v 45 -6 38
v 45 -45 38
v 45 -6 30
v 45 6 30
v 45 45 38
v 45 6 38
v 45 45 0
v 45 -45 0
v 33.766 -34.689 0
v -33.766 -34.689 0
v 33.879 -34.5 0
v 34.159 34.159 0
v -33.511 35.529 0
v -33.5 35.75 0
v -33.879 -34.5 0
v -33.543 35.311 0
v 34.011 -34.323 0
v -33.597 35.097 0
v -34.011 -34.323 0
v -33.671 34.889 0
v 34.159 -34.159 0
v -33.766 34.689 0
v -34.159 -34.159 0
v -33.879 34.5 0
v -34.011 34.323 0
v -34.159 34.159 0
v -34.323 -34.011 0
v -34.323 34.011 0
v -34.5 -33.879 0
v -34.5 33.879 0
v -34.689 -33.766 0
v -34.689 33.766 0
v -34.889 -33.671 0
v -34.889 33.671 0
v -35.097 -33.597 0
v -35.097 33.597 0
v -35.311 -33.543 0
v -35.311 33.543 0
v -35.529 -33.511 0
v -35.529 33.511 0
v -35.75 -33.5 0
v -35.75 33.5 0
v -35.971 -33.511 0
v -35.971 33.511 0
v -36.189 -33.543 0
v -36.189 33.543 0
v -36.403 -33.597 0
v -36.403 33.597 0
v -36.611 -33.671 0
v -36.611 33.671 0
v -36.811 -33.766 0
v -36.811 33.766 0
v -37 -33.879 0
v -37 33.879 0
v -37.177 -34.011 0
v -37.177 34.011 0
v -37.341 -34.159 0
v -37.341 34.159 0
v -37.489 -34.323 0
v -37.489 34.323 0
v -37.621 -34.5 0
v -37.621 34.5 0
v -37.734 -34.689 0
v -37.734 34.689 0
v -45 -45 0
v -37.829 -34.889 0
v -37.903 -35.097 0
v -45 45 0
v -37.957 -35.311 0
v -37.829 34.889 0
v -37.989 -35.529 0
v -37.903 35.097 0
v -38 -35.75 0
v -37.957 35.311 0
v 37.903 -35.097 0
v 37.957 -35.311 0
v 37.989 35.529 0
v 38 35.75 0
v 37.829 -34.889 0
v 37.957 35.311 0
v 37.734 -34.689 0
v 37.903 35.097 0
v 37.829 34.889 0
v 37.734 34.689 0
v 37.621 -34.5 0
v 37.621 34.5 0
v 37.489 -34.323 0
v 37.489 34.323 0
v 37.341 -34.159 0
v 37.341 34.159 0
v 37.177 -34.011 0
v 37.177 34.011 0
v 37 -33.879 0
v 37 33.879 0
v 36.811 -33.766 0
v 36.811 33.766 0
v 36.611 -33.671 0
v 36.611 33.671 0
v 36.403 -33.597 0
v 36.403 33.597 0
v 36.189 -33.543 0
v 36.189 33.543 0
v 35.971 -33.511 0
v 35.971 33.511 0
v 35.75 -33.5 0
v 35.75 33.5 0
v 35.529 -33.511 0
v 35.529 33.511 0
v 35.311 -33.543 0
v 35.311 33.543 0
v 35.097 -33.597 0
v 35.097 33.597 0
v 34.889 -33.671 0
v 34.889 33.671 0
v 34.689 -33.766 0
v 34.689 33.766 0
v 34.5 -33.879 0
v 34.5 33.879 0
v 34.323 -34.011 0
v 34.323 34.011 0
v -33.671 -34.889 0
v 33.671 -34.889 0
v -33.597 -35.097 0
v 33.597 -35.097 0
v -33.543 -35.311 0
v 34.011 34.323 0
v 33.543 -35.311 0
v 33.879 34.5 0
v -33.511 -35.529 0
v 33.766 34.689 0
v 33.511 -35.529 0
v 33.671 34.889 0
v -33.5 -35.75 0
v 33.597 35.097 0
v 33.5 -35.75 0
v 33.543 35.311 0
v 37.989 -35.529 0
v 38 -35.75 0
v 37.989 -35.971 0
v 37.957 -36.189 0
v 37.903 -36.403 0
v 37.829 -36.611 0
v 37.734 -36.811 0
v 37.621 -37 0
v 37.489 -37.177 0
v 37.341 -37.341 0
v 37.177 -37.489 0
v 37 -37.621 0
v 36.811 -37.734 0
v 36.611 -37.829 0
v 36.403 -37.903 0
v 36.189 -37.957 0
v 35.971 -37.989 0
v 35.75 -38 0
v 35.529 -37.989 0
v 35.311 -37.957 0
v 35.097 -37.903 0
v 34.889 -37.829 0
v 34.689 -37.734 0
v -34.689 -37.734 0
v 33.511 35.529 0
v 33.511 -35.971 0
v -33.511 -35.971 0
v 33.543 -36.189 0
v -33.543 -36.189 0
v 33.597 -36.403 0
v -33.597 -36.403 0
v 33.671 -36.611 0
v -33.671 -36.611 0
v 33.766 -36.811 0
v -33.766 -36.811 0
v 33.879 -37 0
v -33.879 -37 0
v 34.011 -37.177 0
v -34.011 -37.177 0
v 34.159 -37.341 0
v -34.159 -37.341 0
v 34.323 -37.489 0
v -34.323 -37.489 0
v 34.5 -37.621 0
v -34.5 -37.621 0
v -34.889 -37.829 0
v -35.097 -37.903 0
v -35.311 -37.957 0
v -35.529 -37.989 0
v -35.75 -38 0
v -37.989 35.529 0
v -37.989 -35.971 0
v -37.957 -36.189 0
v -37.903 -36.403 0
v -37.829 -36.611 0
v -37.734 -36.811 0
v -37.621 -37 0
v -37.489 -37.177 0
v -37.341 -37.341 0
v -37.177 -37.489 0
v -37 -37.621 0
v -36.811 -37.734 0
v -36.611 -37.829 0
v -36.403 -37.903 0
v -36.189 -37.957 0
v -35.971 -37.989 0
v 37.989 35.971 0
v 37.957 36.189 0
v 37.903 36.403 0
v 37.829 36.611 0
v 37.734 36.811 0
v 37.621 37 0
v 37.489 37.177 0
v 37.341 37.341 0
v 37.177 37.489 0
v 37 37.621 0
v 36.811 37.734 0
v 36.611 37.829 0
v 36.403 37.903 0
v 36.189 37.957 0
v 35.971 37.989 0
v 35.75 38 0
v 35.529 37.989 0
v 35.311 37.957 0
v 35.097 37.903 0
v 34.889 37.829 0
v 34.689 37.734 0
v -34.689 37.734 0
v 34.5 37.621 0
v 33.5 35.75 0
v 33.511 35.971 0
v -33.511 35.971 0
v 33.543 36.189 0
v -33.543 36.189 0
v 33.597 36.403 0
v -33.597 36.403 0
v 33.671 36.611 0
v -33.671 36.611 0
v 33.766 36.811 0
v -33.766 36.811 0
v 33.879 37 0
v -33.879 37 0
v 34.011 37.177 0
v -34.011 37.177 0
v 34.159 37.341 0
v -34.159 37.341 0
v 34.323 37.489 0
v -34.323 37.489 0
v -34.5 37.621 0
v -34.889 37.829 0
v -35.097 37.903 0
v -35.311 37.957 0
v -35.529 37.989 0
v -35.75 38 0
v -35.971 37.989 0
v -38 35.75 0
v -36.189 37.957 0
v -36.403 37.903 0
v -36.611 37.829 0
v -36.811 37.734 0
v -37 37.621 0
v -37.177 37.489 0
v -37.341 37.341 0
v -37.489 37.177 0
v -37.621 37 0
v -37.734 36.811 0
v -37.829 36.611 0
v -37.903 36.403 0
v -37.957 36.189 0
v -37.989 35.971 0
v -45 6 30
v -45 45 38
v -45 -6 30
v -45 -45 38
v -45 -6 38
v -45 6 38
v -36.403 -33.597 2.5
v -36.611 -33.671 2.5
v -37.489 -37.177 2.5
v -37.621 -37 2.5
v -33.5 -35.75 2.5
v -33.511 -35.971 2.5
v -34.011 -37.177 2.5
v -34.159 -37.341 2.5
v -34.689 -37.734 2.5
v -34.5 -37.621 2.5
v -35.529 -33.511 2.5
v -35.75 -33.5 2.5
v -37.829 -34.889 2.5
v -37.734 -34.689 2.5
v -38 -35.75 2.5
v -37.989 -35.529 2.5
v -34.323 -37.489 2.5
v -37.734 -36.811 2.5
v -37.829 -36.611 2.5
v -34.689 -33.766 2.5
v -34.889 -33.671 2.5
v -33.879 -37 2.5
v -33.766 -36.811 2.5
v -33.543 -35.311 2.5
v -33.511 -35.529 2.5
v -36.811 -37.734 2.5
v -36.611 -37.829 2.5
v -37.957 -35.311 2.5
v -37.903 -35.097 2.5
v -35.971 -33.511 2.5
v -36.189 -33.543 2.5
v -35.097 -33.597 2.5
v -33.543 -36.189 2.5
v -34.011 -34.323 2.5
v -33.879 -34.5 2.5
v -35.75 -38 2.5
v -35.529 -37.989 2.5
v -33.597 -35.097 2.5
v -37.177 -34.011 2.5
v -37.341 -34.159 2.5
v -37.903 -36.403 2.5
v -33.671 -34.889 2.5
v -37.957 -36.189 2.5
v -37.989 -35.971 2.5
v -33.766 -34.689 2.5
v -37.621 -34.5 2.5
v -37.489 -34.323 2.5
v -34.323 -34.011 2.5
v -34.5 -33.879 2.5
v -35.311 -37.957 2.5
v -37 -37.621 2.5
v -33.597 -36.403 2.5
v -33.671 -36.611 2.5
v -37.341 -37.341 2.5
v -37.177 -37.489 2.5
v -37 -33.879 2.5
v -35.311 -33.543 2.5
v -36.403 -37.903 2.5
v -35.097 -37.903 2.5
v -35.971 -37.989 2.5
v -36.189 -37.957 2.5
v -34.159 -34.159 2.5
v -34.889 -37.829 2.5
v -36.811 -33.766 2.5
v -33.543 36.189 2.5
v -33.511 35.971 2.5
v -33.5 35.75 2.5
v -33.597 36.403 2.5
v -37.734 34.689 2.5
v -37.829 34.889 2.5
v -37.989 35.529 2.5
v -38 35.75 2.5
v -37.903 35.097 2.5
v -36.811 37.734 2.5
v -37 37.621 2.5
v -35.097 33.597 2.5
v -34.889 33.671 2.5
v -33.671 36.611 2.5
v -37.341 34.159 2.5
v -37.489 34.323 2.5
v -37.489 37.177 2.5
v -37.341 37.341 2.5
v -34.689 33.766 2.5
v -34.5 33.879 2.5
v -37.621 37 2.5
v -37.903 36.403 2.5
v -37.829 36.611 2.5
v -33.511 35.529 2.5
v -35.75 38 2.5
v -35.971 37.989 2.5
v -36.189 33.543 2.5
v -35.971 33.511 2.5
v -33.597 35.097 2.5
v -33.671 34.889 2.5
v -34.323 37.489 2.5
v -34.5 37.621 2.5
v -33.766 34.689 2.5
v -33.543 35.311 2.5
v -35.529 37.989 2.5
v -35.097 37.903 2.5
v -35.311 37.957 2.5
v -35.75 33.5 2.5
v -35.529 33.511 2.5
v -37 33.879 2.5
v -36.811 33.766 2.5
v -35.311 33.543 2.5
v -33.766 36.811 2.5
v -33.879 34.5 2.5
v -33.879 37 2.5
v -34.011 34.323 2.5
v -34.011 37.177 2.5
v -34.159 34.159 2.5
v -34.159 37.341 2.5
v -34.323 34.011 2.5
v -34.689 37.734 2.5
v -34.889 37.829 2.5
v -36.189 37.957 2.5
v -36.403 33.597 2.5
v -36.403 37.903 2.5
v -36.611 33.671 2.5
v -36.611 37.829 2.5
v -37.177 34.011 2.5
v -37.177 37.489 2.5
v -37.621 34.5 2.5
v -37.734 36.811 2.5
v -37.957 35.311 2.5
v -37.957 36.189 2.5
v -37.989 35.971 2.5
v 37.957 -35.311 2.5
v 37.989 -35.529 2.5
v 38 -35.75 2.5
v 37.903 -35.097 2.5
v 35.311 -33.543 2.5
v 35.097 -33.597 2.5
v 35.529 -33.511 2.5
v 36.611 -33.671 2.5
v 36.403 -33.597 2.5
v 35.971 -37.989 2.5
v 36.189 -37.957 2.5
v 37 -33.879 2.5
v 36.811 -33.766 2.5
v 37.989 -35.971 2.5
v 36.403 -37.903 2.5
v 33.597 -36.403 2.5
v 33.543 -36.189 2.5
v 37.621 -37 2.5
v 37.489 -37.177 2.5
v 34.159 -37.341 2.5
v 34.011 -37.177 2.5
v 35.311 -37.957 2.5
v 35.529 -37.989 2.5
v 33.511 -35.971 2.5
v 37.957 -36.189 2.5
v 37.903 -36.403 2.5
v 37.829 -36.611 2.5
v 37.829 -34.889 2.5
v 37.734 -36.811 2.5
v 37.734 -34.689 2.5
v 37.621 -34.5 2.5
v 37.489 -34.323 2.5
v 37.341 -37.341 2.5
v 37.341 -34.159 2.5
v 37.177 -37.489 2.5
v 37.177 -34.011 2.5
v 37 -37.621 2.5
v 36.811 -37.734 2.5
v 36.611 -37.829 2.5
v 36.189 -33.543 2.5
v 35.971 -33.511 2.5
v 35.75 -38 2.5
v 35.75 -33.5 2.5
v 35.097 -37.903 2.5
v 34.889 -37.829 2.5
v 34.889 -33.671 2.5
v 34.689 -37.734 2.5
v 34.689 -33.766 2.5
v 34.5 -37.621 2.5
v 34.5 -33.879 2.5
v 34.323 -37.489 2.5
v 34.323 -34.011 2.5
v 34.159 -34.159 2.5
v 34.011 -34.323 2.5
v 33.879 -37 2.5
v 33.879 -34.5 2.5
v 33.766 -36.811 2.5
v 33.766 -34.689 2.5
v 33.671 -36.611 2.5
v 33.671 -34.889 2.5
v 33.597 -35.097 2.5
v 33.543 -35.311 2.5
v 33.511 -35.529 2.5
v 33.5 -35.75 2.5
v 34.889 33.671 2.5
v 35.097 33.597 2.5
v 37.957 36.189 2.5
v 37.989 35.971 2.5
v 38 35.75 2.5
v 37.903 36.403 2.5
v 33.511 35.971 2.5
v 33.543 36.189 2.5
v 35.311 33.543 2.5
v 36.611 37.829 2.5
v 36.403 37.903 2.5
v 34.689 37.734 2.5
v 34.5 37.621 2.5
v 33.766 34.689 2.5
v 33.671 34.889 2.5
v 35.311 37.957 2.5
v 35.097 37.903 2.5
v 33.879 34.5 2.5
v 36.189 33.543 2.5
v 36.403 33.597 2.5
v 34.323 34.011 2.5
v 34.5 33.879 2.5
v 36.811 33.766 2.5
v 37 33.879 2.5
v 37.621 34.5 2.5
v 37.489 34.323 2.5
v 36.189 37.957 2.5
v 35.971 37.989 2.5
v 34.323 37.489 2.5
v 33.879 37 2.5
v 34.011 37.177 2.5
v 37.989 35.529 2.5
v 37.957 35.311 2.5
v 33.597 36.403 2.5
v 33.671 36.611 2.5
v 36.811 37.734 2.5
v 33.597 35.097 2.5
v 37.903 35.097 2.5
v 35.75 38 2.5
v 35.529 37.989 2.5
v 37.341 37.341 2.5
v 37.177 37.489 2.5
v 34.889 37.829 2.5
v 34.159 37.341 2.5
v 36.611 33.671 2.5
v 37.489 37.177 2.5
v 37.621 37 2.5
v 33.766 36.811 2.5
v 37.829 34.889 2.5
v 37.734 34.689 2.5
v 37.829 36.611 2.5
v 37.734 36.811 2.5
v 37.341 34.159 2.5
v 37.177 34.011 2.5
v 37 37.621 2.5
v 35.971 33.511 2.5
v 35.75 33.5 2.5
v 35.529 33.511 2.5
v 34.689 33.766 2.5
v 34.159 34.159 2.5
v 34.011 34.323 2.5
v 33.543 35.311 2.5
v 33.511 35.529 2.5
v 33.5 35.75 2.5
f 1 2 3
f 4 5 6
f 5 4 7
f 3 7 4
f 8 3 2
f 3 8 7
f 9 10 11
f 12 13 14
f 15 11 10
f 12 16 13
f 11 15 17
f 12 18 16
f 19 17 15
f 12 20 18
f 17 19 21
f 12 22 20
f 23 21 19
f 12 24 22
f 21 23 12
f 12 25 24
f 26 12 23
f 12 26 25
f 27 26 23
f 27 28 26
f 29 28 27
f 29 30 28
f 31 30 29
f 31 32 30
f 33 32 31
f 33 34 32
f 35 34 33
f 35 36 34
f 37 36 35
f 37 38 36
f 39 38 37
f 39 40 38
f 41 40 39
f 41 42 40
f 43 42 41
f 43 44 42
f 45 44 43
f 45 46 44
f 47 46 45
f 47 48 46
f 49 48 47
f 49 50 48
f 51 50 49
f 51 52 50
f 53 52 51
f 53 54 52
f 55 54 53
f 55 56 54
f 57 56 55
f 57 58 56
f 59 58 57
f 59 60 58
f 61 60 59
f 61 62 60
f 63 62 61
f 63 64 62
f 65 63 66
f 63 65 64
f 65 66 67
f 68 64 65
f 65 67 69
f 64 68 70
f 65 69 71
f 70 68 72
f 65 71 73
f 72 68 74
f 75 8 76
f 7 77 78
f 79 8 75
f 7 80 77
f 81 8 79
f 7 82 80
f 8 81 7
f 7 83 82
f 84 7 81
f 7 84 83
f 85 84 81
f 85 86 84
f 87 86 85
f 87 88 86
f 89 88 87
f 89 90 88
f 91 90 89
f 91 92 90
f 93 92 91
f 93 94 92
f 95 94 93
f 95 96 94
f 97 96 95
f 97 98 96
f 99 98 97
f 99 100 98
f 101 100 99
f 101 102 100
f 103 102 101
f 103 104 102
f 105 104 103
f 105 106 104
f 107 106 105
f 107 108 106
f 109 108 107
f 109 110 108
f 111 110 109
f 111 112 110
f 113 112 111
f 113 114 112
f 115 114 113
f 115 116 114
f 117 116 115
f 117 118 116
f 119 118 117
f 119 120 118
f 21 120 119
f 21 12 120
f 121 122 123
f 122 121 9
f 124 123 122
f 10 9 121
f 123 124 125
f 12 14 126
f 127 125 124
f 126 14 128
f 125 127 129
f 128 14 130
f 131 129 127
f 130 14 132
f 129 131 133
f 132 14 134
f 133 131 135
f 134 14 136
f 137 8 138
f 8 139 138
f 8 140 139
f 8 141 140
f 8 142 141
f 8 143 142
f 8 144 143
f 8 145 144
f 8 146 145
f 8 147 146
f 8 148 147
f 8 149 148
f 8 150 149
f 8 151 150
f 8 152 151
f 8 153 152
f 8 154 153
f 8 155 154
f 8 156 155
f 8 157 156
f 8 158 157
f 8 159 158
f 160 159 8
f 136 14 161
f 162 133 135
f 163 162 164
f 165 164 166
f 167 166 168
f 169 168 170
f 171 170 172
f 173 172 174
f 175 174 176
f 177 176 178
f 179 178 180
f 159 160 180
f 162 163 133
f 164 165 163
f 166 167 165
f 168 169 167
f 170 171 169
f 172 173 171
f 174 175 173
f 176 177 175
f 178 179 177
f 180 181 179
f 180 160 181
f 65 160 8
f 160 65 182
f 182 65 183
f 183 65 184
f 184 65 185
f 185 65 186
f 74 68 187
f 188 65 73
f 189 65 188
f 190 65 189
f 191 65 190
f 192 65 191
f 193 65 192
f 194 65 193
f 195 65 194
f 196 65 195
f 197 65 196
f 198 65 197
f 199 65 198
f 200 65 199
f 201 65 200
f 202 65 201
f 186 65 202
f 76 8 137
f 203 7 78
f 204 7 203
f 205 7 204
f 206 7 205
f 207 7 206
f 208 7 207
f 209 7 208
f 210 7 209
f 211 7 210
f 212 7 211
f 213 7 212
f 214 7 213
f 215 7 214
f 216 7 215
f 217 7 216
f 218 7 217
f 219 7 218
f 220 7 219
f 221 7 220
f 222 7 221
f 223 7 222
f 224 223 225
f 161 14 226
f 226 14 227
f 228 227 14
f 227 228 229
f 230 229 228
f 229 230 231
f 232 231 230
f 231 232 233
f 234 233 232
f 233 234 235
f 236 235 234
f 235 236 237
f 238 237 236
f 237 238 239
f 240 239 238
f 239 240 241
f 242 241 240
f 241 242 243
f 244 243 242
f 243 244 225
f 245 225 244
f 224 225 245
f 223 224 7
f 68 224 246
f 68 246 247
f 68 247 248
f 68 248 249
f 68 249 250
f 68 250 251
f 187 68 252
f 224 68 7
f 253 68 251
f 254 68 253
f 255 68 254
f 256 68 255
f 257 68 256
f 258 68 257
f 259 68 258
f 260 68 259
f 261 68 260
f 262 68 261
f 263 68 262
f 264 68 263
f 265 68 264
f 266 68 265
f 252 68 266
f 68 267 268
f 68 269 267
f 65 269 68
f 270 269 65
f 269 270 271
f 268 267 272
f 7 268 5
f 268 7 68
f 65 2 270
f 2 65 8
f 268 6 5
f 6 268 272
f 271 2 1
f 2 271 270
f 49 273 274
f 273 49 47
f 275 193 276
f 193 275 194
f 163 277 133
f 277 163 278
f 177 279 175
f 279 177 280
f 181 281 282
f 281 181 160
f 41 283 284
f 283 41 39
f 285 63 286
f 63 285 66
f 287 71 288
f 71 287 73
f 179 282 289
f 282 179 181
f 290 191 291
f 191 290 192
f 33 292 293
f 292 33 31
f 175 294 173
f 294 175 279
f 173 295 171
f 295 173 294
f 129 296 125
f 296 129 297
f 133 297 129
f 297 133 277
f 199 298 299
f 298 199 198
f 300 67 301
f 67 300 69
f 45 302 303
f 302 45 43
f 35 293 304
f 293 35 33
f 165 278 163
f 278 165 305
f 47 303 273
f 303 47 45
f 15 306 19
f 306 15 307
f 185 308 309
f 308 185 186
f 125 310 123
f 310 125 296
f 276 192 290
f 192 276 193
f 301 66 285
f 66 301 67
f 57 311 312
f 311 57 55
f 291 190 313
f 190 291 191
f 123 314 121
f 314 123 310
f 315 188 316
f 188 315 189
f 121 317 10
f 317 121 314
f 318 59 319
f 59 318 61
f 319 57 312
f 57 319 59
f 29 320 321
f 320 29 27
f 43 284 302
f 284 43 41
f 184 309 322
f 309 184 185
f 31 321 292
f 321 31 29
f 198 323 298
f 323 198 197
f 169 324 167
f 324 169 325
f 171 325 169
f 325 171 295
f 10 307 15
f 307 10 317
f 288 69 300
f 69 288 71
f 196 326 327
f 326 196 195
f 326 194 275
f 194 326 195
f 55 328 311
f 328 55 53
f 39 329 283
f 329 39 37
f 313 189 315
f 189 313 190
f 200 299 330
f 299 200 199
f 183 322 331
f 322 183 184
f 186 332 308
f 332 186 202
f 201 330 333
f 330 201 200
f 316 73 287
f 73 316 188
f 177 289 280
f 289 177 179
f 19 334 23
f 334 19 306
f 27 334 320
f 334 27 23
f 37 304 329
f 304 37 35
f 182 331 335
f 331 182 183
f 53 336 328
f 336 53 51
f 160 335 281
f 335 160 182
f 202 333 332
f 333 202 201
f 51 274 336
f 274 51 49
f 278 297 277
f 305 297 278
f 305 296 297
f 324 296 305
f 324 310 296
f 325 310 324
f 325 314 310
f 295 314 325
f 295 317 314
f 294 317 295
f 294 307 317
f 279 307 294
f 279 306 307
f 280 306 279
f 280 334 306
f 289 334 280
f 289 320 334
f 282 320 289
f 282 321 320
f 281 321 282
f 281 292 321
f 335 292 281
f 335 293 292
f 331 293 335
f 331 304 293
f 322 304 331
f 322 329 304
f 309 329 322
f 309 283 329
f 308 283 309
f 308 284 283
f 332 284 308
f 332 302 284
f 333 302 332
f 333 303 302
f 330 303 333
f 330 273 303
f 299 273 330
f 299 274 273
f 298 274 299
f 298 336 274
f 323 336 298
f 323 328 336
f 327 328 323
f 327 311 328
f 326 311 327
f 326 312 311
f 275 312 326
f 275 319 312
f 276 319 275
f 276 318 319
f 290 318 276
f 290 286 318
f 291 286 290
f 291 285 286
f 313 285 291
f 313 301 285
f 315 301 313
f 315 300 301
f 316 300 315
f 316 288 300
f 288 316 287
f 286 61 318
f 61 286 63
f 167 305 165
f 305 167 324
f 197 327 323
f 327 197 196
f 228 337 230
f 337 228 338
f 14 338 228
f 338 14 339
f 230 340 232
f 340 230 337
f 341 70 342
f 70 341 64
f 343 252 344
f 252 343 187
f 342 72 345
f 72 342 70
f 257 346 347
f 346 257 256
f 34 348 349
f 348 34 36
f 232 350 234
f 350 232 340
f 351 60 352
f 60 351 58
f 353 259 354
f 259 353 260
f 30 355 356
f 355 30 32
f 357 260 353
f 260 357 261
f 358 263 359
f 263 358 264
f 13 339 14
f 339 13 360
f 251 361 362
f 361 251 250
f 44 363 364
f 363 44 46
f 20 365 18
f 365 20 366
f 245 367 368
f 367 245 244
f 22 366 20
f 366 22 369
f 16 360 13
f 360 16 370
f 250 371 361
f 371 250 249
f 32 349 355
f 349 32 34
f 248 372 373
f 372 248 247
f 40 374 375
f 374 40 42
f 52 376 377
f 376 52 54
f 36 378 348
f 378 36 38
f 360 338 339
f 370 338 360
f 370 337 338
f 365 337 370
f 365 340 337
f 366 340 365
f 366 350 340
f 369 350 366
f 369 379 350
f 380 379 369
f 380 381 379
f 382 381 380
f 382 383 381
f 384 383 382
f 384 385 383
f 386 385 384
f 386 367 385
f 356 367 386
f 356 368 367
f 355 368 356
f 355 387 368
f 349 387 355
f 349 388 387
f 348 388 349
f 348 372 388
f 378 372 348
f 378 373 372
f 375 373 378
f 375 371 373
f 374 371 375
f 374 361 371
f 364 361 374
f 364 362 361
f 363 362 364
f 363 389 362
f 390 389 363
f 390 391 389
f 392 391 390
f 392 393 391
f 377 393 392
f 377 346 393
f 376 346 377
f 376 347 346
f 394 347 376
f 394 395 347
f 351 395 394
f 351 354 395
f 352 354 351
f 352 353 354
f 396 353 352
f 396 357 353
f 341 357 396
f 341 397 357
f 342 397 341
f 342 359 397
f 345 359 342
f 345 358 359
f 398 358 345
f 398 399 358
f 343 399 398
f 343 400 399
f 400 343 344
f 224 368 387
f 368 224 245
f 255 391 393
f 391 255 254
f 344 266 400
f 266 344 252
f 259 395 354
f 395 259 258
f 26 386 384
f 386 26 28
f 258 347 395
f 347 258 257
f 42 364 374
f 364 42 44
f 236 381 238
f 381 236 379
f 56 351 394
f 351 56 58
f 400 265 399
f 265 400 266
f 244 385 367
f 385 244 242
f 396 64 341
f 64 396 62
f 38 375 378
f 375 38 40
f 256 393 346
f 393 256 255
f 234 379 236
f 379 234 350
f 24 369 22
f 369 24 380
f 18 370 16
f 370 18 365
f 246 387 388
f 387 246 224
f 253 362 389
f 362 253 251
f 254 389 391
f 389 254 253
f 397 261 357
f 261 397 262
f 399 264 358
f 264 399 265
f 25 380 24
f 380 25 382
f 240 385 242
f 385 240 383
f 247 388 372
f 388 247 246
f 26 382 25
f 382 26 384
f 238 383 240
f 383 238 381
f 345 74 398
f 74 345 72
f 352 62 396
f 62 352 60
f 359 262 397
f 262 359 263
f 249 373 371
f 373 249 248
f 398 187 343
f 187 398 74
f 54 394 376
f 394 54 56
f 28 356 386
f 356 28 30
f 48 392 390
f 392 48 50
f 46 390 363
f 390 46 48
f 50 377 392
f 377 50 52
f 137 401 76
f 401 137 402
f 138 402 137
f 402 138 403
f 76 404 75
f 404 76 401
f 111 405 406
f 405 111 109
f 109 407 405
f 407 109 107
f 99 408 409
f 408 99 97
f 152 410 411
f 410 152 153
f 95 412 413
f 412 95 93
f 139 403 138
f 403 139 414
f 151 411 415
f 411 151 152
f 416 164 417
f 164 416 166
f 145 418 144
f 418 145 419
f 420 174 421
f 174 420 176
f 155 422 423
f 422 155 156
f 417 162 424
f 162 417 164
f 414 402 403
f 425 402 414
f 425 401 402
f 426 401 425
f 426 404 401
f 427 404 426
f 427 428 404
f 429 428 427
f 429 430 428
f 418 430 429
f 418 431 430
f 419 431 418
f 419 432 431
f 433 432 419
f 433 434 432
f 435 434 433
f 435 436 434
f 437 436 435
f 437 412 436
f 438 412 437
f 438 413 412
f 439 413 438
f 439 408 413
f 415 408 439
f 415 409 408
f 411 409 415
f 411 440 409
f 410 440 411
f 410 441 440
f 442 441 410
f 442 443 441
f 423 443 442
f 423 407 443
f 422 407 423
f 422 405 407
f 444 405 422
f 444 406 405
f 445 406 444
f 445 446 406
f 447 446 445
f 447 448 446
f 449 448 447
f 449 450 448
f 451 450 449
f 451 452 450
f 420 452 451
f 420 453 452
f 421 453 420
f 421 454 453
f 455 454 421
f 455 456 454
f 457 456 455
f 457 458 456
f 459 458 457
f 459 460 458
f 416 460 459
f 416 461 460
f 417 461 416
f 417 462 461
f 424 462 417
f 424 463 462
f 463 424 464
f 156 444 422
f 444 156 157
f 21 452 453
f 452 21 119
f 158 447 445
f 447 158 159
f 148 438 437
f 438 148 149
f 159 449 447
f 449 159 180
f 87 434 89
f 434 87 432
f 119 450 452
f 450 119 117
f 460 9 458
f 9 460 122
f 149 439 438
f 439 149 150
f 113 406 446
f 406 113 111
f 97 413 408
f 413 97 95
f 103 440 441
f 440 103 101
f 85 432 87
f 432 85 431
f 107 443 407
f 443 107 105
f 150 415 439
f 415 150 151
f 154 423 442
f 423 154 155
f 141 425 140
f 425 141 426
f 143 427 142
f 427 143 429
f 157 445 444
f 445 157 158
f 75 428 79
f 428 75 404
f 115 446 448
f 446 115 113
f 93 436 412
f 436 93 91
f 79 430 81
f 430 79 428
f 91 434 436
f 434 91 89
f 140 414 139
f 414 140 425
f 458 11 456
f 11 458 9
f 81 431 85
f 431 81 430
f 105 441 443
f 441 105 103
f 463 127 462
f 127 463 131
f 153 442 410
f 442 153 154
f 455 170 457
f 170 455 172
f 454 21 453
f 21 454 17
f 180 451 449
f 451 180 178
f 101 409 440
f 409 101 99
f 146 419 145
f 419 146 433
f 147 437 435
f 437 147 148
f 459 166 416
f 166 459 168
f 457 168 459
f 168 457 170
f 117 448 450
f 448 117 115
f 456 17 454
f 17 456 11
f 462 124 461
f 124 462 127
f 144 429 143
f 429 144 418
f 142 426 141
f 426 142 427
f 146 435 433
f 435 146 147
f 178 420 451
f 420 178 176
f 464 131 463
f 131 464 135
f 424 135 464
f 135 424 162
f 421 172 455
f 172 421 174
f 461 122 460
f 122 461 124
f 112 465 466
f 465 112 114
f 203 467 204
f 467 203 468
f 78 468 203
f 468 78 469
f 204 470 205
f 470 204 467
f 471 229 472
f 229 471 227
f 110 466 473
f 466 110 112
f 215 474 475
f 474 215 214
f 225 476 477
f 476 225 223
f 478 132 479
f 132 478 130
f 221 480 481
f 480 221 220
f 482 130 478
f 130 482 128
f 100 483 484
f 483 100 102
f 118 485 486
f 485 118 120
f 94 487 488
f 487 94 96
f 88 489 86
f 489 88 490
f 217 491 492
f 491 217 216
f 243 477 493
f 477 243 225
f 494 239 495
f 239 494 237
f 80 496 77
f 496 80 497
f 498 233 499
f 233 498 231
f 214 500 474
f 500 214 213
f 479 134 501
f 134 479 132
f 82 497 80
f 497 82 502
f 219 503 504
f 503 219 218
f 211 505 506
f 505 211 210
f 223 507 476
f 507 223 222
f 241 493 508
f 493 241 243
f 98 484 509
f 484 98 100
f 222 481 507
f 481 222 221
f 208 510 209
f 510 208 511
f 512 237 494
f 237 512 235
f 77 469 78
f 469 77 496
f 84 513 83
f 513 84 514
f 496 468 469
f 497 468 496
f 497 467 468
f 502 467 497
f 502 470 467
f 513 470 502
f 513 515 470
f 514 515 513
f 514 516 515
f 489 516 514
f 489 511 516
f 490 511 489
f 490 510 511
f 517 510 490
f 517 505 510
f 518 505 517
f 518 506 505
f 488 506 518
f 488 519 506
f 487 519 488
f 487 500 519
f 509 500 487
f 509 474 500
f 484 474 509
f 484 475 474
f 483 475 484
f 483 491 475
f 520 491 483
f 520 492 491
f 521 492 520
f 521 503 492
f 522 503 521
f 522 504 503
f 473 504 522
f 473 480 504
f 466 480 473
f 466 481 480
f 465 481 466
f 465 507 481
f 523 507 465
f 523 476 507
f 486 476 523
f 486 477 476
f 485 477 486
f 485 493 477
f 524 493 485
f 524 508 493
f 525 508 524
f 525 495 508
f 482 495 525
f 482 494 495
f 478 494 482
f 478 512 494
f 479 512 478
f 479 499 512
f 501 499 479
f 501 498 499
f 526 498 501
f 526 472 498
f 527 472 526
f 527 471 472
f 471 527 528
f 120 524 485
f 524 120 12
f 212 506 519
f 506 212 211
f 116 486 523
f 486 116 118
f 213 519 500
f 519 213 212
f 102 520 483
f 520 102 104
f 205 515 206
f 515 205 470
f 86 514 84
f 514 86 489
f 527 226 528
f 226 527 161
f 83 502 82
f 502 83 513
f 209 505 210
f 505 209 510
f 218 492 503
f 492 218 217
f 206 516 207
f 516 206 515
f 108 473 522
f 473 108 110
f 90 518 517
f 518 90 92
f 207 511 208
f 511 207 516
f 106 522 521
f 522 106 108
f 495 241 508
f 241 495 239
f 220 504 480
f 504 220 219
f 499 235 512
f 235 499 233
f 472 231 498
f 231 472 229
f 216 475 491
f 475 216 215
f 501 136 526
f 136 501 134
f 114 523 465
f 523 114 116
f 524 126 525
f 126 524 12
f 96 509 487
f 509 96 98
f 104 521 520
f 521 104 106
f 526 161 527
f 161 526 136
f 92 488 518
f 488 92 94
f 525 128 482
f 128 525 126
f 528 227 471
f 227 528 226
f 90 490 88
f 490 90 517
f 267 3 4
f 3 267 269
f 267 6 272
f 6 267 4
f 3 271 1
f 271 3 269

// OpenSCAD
// Magnetic stirrer housing (PC fan cover) - print orientation: upside down
// Top plate on bed, walls rise to open top.

$fn = 64;

// ---- Dimensions (mm) ----
plate_t      = 2;     // top plate thickness
wall_t       = 2.5;   // wall thickness
box_h        = 40;    // total height (plate + walls)
outer_x      = 90;    // outer size X
outer_y      = 90;    // outer size Y
hole_d       = 4.5;   // M4 screw holes
hole_p       = 71.5;  // screw hole pattern size (square)
notch_w      = 12;    // cable notch width
notch_bottom = 8;     // notch depth from open edge (z = 32 to 40)
eps          = 0.5;   // cutter overshoot

// ---- Model ----
difference() {
    union() {
        // Top plate
        translate([-outer_x/2, -outer_y/2, 0])
            cube([outer_x, outer_y, plate_t]);
        // Walls (open top)
        translate([-outer_x/2, -outer_y/2, 0])
            cube([outer_x, outer_y, box_h - plate_t]);
    }
    // Screw holes
    for (sx = [-hole_p/2, hole_p/2], sy = [-hole_p/2, hole_p/2])
        translate([sx, sy, -eps])
            cylinder(d = hole_d, h = plate_t + 2*eps);
    // Cable notch in one wall
    translate([-outer_x/2, -notch_w/2, box_h - plate_t - notch_bottom])
        cube([outer_x - 2*(-outer_x/2), notch_w, notch_bottom + eps]);
}
